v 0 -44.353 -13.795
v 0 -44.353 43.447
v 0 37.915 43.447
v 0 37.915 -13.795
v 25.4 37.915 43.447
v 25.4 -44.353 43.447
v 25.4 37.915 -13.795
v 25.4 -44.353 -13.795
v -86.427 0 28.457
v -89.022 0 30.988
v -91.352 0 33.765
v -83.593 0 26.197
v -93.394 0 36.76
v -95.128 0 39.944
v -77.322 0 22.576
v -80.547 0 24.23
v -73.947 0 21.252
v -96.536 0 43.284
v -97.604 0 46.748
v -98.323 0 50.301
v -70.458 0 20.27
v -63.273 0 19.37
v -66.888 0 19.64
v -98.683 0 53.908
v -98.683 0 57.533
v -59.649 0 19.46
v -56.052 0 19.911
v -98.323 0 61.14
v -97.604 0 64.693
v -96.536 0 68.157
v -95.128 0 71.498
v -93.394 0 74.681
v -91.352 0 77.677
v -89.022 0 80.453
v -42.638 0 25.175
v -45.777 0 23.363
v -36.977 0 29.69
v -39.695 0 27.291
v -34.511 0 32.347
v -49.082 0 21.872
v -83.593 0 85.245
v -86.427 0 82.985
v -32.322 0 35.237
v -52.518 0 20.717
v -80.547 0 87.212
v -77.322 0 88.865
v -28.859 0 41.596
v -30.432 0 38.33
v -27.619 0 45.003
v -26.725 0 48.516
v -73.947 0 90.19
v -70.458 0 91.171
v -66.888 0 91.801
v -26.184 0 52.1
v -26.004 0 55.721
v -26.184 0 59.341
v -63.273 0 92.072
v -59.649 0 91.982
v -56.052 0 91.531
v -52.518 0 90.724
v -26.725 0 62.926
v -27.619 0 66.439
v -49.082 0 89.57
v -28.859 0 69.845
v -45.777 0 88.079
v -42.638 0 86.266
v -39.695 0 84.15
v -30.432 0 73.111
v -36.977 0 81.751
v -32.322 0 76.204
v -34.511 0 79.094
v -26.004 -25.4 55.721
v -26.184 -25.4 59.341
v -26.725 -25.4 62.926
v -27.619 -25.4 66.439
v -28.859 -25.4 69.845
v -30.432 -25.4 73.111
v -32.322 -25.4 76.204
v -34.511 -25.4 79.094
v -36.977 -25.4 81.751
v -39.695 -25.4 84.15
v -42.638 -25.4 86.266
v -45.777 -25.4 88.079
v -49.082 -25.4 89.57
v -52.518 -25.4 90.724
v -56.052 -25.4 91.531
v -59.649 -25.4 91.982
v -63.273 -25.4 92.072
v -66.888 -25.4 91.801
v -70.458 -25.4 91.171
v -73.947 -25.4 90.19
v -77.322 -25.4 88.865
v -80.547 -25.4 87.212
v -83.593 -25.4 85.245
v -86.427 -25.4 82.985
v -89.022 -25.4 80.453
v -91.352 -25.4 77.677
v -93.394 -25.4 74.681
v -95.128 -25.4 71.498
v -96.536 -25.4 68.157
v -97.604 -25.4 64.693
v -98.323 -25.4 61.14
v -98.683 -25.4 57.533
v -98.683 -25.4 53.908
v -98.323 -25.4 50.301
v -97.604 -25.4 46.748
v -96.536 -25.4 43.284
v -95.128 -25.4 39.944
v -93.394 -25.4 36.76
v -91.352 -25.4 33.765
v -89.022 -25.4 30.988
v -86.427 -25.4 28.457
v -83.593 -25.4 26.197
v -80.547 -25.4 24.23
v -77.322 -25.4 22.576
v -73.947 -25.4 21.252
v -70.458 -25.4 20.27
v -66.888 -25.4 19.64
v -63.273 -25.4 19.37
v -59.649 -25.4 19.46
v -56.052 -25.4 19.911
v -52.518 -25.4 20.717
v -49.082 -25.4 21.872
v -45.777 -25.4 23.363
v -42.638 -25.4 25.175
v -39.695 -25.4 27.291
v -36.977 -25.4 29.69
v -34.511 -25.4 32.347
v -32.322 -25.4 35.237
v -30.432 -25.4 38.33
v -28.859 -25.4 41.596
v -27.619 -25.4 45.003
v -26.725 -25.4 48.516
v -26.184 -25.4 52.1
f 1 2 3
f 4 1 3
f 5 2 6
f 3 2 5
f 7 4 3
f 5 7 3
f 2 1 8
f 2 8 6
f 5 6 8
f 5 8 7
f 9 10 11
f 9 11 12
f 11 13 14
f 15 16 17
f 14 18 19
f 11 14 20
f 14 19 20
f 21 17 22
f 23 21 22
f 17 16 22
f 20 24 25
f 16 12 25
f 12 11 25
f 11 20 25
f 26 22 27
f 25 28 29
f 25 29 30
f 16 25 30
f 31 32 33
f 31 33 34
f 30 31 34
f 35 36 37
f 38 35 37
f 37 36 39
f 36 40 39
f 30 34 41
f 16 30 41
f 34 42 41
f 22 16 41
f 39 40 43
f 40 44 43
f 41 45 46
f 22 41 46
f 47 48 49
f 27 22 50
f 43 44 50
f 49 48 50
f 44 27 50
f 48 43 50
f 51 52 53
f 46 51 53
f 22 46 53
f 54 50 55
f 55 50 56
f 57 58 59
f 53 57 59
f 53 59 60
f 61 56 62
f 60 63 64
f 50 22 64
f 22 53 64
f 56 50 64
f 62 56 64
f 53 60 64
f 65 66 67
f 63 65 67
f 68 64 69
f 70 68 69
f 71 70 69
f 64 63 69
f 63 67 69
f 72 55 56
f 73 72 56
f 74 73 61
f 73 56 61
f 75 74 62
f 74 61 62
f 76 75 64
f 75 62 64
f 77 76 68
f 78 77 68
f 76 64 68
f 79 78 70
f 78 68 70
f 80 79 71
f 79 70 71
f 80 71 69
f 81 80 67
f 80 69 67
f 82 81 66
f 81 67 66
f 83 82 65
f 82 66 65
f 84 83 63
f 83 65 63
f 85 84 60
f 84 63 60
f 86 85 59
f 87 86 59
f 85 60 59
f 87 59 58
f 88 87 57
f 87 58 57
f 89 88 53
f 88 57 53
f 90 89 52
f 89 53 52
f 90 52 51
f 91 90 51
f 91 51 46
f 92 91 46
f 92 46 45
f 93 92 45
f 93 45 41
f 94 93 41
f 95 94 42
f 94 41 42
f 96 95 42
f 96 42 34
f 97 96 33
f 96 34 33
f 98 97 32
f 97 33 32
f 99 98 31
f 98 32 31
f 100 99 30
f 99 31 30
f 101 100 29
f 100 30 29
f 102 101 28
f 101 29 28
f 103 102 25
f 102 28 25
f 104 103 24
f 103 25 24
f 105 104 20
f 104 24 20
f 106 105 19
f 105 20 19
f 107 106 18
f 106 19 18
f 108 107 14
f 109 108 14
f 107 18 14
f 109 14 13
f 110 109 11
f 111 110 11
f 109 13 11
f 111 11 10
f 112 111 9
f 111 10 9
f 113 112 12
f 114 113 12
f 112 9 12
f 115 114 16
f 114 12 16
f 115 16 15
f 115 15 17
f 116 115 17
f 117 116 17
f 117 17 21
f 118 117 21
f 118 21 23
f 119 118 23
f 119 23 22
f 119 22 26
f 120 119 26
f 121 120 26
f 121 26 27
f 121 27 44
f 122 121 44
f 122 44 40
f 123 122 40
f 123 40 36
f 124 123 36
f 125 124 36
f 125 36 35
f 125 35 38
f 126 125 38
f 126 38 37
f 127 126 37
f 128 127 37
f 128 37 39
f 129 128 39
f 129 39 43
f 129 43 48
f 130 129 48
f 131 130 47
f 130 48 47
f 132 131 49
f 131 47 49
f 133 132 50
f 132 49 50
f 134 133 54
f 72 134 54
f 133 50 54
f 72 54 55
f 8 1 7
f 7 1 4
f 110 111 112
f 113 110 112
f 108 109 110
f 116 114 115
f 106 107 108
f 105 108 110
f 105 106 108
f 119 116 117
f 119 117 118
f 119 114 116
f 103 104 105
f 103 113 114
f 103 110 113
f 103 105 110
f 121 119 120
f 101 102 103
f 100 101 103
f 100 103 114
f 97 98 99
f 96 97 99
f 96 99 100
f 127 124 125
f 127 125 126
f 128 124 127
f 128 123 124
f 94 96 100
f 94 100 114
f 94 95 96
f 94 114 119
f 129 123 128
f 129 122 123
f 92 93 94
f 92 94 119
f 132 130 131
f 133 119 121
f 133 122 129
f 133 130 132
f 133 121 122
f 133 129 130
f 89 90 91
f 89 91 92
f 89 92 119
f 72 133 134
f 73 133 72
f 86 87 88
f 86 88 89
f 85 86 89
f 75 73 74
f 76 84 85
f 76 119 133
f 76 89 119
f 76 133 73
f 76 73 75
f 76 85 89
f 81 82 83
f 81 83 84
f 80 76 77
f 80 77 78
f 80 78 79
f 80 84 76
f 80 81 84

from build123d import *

# Parameters (mm, degrees)
F0_W     = 82.268014
F0_H     = 57.241838
F1_DEPTH = 25.4
F2_R     = 36.362446
F3_DEPTH = 25.4


with BuildPart() as f1:
    # F0 (on Right) → F1 (new body)
    with BuildSketch(Plane.YZ):
        with Locations((-3.21918, 14.826274)):
            Rectangle(F0_W, F0_H)
    extrude(amount=F1_DEPTH)


with BuildPart() as f3:
    # F2 (on Front) → F3 (new body)
    with BuildSketch(Plane.XZ):
        with Locations((-62.366229, 55.720732)):
            Circle(F2_R)
    extrude(amount=F3_DEPTH)


solid = Compound([f1.part, f3.part])
